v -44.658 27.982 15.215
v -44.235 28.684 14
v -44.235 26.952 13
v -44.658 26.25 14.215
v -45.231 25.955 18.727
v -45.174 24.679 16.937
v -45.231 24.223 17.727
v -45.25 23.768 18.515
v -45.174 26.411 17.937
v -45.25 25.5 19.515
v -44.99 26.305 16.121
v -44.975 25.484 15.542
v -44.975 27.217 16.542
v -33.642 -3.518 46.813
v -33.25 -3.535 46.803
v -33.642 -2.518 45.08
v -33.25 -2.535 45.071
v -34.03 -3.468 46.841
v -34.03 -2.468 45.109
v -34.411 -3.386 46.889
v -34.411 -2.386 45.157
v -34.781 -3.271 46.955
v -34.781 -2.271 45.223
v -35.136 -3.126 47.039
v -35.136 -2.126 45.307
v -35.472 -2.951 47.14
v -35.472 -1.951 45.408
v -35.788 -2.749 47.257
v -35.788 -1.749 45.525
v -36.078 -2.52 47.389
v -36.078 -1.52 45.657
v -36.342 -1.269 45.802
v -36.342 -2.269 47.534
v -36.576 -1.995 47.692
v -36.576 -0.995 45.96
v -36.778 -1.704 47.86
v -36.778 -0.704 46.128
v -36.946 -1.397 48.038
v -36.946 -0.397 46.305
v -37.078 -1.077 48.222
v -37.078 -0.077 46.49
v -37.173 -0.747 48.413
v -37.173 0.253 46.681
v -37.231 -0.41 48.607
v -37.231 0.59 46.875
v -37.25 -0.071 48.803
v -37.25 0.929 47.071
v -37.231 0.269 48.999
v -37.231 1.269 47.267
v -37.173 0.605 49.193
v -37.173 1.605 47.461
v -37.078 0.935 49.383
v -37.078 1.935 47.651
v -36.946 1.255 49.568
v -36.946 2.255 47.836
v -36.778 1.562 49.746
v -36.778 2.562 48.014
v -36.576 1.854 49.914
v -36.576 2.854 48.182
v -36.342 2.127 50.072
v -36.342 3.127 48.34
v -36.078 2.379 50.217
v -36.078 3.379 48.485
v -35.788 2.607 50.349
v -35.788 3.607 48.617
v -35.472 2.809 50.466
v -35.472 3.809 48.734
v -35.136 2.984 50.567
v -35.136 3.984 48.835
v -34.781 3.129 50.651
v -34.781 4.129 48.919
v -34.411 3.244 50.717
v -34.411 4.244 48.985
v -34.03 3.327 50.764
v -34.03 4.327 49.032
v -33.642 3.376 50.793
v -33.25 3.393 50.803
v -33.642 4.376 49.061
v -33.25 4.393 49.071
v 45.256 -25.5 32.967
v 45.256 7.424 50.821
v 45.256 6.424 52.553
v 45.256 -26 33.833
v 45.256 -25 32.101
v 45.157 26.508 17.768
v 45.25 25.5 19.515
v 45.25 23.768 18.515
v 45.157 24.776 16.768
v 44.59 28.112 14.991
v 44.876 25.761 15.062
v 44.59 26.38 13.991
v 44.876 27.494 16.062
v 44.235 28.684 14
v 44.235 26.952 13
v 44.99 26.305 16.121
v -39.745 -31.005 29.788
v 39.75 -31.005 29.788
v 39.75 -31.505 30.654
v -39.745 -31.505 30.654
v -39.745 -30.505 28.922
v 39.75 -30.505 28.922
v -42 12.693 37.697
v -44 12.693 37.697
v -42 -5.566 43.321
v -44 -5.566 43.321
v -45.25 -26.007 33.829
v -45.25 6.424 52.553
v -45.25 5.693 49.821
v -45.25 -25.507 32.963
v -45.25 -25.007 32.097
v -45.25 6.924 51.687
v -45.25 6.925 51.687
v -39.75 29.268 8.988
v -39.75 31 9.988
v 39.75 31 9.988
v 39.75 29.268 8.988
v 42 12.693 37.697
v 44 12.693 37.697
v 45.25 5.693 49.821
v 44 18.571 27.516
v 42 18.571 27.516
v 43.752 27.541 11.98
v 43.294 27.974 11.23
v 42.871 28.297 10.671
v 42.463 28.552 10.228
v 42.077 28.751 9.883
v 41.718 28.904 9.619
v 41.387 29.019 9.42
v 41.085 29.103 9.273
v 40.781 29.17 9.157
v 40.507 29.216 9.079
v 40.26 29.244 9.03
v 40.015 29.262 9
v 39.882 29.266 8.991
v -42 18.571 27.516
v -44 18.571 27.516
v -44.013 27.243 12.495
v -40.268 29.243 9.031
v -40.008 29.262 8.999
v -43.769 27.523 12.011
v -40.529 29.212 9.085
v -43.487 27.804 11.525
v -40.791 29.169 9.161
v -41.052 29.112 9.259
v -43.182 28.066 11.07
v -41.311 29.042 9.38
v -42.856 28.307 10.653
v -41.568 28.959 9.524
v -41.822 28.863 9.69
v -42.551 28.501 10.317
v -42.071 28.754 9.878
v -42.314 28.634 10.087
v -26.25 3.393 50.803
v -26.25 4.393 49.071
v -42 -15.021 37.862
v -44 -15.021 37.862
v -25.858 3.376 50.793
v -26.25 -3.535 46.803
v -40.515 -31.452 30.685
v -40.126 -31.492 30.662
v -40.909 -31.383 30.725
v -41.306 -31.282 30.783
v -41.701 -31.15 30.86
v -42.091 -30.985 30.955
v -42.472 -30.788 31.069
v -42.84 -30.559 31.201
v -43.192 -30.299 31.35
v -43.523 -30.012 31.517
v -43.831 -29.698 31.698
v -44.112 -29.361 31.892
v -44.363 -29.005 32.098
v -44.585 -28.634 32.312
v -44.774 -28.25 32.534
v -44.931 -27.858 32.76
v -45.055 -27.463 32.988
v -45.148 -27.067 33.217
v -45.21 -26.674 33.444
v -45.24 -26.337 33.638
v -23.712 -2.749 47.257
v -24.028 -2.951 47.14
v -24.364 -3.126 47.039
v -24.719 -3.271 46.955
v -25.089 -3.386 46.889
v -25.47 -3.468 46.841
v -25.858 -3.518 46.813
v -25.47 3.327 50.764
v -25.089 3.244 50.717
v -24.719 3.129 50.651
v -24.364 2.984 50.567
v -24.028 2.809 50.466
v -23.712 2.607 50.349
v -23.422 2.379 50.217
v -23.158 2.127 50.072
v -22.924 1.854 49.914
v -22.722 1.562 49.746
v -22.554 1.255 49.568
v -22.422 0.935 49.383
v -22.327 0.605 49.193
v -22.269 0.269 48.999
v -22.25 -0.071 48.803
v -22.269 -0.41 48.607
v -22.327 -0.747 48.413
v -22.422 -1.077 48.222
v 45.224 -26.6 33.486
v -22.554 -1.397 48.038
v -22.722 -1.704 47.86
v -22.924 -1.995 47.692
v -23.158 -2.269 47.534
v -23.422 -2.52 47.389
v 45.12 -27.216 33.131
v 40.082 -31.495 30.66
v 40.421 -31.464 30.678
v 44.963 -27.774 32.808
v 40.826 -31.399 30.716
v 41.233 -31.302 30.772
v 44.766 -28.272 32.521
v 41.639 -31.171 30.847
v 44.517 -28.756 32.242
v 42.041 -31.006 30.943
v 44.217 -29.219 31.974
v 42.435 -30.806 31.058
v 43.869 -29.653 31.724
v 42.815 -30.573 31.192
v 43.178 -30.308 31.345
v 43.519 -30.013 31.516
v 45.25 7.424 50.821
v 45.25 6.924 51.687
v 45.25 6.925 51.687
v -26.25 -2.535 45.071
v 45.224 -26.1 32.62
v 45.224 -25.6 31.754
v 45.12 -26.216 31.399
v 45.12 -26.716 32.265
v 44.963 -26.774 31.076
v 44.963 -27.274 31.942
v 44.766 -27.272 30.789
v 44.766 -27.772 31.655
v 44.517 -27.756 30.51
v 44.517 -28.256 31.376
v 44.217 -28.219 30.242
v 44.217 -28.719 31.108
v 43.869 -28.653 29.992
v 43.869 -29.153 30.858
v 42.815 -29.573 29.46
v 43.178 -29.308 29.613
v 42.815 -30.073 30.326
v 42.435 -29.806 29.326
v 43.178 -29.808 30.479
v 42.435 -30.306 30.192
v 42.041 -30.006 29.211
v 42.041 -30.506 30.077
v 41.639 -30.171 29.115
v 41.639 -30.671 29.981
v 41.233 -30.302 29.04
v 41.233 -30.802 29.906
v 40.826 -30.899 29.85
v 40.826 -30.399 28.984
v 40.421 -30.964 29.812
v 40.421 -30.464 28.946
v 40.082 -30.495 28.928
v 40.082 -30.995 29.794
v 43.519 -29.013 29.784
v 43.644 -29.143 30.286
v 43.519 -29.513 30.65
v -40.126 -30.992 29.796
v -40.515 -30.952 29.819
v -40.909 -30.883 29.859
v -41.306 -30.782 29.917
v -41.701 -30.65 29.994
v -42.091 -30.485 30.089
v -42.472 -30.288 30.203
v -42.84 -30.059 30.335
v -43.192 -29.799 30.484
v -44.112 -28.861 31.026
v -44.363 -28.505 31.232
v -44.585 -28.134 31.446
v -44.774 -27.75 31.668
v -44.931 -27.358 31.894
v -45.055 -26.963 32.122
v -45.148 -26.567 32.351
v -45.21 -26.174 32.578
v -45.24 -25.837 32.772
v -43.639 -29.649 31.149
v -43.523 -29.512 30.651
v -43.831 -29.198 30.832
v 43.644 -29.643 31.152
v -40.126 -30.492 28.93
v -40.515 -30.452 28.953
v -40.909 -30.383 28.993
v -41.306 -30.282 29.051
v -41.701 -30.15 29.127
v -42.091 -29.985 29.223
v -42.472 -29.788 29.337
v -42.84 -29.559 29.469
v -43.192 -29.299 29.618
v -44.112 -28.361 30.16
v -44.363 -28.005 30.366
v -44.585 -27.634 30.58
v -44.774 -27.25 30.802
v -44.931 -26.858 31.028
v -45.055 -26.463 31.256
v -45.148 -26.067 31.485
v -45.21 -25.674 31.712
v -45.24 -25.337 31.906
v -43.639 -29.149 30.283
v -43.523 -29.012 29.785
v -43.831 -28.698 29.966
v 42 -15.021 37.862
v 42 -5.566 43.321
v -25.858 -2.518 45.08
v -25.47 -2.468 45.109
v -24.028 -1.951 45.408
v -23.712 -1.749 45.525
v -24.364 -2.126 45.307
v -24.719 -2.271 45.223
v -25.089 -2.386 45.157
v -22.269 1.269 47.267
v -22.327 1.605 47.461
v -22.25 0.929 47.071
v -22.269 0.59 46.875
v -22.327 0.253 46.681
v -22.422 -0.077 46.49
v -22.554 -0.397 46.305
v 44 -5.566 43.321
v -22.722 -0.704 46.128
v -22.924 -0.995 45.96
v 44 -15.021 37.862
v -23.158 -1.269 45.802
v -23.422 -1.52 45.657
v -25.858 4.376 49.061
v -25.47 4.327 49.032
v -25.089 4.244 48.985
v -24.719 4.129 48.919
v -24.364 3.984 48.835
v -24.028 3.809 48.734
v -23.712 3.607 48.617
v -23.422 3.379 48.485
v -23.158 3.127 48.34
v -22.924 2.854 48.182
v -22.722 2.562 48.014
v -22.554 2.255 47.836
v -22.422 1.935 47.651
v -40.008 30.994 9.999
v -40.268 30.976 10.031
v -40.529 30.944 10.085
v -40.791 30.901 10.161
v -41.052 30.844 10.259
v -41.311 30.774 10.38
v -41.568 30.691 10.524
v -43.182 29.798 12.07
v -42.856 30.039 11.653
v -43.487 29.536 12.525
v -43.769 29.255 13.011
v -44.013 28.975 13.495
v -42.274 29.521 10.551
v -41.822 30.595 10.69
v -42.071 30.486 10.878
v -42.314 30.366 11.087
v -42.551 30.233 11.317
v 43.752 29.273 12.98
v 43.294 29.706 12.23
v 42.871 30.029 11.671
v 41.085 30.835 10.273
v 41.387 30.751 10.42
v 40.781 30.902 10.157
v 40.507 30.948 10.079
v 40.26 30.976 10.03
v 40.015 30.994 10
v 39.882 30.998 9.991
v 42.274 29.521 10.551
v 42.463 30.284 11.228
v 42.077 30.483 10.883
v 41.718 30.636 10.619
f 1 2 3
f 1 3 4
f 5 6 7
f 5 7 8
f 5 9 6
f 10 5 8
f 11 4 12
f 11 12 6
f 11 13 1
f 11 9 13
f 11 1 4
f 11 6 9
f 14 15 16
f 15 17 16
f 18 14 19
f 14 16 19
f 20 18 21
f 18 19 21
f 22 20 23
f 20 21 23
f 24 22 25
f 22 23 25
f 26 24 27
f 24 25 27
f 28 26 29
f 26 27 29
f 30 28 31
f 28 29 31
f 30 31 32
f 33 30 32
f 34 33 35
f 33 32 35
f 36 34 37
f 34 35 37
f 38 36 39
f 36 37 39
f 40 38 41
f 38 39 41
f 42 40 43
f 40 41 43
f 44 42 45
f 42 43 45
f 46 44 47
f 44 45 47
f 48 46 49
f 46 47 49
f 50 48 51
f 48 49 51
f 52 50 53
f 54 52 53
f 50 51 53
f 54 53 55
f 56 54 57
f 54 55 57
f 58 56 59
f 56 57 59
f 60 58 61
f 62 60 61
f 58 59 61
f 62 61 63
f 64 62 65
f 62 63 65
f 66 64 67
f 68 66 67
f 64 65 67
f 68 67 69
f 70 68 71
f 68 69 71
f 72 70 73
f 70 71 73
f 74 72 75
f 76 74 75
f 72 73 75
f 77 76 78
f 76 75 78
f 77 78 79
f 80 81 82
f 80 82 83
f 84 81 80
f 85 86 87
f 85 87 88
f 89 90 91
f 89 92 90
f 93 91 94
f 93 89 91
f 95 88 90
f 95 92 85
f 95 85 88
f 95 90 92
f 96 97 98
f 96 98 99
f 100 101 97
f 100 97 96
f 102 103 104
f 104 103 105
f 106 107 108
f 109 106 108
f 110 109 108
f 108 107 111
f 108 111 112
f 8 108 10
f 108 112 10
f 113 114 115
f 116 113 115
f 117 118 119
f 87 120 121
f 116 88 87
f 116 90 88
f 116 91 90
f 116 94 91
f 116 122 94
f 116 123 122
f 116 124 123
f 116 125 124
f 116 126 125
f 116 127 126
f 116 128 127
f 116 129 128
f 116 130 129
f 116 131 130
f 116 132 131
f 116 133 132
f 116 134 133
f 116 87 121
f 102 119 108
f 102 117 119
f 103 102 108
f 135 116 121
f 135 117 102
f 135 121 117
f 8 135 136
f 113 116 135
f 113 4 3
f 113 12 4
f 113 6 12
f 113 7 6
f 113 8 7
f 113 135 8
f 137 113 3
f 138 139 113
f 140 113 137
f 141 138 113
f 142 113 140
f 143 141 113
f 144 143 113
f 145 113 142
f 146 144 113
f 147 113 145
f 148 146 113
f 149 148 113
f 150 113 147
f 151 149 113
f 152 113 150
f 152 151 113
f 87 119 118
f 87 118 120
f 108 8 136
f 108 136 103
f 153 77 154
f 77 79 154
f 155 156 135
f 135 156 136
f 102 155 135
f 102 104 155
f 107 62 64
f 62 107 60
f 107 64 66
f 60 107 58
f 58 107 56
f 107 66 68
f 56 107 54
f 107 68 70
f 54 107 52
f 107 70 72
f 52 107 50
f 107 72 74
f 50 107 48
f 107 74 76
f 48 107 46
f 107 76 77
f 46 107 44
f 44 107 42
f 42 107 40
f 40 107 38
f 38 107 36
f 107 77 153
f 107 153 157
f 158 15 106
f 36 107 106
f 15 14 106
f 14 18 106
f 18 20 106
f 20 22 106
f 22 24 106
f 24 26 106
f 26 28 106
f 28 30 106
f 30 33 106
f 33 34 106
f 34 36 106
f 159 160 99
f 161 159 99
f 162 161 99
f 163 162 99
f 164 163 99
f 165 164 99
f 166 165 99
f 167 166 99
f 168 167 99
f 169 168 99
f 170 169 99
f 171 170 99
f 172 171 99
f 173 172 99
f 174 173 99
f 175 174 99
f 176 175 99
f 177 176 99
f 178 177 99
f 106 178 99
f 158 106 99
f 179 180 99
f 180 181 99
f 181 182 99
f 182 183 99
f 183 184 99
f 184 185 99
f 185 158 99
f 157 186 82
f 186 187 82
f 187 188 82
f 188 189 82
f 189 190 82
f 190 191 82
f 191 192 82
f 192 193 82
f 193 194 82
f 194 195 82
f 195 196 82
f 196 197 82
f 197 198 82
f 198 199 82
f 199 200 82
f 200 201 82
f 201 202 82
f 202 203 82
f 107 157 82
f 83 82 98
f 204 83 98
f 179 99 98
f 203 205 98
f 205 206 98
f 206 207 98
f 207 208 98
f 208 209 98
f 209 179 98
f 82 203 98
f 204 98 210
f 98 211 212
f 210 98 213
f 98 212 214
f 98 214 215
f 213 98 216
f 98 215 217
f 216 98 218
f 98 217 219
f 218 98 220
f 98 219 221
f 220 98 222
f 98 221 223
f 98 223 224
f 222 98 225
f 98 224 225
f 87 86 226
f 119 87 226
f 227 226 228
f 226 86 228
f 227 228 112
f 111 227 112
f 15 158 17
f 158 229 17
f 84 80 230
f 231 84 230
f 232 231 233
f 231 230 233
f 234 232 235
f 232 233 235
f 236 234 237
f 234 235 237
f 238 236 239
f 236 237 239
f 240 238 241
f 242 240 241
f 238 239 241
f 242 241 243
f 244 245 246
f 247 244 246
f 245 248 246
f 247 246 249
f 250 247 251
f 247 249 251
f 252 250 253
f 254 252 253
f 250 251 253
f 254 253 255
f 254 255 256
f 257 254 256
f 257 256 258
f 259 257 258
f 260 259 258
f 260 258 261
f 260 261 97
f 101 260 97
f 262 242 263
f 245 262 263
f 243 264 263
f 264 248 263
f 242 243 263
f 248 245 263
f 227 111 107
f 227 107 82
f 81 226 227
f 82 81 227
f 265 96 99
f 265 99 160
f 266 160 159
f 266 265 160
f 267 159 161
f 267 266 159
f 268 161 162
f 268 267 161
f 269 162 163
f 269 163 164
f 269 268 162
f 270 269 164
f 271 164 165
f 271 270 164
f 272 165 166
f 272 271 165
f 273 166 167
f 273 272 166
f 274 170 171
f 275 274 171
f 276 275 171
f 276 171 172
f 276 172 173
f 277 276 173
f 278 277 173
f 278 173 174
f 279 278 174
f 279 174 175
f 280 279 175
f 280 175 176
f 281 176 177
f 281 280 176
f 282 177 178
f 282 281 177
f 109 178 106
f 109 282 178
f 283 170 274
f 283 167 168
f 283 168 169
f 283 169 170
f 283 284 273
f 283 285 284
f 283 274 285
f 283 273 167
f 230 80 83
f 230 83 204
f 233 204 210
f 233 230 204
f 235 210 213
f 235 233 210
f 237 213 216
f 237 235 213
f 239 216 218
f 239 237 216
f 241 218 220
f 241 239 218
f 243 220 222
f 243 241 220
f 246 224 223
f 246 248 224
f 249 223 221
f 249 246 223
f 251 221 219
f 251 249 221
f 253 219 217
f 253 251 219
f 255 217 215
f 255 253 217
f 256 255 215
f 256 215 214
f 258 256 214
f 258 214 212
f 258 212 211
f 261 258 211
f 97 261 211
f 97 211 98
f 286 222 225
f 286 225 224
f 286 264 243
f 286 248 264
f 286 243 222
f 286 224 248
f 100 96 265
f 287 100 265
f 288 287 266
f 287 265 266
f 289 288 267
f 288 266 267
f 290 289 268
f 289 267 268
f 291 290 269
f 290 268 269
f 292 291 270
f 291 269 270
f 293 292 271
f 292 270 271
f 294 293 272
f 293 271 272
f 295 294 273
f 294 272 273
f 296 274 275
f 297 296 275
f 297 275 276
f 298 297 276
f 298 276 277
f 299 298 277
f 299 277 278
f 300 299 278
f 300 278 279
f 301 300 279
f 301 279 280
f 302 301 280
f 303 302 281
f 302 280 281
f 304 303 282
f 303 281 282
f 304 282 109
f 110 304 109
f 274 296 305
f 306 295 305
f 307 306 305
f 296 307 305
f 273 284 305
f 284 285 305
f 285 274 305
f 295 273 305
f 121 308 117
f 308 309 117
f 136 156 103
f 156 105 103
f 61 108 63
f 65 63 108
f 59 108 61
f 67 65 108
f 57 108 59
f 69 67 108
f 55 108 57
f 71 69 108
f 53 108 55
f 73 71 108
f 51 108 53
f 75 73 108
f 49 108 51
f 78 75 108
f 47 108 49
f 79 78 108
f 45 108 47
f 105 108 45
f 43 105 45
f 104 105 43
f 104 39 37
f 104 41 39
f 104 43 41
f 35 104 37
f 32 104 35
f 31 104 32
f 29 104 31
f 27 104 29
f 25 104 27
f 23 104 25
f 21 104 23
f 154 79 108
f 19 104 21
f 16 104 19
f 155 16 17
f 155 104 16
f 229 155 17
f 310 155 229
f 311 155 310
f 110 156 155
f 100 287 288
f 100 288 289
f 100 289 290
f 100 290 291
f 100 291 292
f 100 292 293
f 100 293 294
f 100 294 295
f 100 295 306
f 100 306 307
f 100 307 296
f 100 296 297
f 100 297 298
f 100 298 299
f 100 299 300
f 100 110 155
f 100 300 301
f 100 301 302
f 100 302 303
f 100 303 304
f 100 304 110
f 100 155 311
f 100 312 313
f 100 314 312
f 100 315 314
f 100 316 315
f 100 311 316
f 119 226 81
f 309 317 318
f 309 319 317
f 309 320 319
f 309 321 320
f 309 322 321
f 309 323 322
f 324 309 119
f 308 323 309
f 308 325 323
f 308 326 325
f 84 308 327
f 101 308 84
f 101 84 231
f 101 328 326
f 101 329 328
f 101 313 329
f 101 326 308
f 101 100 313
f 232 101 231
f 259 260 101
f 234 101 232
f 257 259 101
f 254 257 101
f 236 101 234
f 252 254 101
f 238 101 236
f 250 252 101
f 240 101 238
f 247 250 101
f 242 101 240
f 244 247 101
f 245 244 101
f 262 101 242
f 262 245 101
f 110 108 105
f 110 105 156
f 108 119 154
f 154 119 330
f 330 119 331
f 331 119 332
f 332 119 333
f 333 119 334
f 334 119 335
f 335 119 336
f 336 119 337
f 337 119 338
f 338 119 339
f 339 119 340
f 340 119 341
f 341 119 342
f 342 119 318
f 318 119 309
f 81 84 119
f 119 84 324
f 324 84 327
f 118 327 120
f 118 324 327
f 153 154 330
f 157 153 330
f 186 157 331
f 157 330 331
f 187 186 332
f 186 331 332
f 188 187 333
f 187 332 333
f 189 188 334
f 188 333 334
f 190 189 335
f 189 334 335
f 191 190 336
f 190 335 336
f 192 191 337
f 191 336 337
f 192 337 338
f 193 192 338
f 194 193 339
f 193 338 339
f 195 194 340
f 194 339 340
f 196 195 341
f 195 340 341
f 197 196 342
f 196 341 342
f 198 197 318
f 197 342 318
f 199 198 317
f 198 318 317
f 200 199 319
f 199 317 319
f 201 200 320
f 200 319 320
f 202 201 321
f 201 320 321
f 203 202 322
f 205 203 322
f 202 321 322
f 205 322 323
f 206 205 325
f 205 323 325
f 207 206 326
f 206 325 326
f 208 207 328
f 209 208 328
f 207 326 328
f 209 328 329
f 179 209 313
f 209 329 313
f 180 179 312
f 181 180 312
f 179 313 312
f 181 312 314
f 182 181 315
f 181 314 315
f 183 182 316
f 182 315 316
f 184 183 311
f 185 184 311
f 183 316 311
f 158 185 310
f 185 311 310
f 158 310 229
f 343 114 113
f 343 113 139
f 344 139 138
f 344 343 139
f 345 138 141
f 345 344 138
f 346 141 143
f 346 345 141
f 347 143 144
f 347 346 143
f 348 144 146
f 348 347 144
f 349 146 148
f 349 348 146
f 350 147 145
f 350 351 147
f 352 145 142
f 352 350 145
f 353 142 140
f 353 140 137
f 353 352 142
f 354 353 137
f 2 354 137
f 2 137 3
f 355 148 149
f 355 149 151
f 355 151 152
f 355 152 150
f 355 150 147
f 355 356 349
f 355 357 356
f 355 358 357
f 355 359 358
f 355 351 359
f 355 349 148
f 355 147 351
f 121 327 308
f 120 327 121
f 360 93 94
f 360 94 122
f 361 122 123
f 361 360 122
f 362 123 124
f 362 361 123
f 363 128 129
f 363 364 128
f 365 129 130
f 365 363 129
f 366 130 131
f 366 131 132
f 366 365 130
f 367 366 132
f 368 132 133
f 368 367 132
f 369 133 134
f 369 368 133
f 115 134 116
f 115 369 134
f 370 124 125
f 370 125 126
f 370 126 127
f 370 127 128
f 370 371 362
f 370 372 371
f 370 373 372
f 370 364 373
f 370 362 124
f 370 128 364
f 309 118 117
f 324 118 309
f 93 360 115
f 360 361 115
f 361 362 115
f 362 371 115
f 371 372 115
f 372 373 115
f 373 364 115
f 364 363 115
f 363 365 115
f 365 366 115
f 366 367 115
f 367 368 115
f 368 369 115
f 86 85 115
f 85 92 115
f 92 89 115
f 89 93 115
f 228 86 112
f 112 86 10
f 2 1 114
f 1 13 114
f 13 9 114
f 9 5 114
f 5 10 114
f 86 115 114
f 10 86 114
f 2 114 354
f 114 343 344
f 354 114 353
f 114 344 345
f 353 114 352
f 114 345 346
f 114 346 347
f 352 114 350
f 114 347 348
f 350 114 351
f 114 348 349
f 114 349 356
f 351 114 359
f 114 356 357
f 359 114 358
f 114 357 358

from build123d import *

# Parameters (mm, degrees)
EXTRUDE012_DEPTH                          = 2
EXTRUDE013_DEPTH                          = 2
EXTRUDE014_DEPTH                          = 2
EXTRUDE011_DEPTH                          = 1
EXTRUDE011_ONTO_SKETCH012_PLACEMENT_ANGLE = 210


with BuildPart() as extrude012:
    # Facebinder001 → Extrude012 (new body)
    with BuildSketch(Plane(origin=(0, 18.8977675755, 30.9501387124), x_dir=(-1, 0, 0), z_dir=(0, -0.8660254038, -0.5))):
        with BuildLine():
            Line((-45.25, 13.204464849), (-45.25, -23.9452774122))
            Line((-45.25, -23.9452774122), (45.25, -23.9452774122))
            Line((45.25, -23.9452774122), (45.25, 13.2044648491))
            add(Edge.make_bspline(
                [(44.2347028524, 19.5723342968), (45.25, 16.7121588166), (45.25, 13.2044648491)],
                knots=[0.953420723, 0.953420723, 0.953420723, 1.5707963268, 1.5707963268, 1.5707963268], degree=2, weights=[1, 0.9527330472, 1]))
            add(Edge.make_bspline(
                [(39.75, 24.204464849), (42.590402015, 24.204464849), (44.2347028524, 19.5723342968)],
                knots=[0, 0, 0, 0.953420723, 0.953420723, 0.953420723], degree=2, weights=[1, 0.8885092072, 1]))
            Line((39.75, 24.204464849), (-39.75, 24.204464849))
            add(Edge.make_bspline(
                [(-44.2347028524, 19.5723342968), (-42.590402015, 24.204464849), (-39.75, 24.204464849)],
                knots=[5.3297645842, 5.3297645842, 5.3297645842, 6.2831853072, 6.2831853072, 6.2831853072], degree=2, weights=[1, 0.8885092072, 1]))
            add(Edge.make_bspline(
                [(-45.25, 13.204464849), (-45.25, 16.7121588165), (-44.2347028524, 19.5723342968)],
                knots=[4.7123889804, 4.7123889804, 4.7123889804, 5.3297645842, 5.3297645842, 5.3297645842], degree=2, weights=[1, 0.9527330472, 1]))
        make_face()
    extrude(amount=EXTRUDE012_DEPTH)


with BuildPart() as extrude013:
    # Sketch013 → Extrude013 (new body)
    with BuildSketch(Plane.YZ.offset(44)):
        Polygon((-15.020984158, 37.8620624495), (18.5712846291, 27.5156237634), (12.6930780618, 37.6969761952), (-5.5661322003, 43.3208237725), align=None)
    extrude(amount=-EXTRUDE013_DEPTH)


with BuildPart() as extrude014:
    # Sketch013 → Extrude014 (new body)
    with BuildSketch(Plane.YZ.offset(44)):
        Polygon((-15.020984158, 37.8620624495), (18.5712846291, 27.5156237634), (12.6930780618, 37.6969761952), (-5.5661322003, 43.3208237725), align=None)
    extrude(amount=EXTRUDE014_DEPTH)


with BuildPart() as extrude014_1:
    # Extrude014 placement: moved
    add(extrude014.part.moved(Location((-88, 0, 0))))


with BuildPart() as connect003:
    # Sketch012 as drawn → Extrude011 (new, symmetric)
    with BuildSketch(Plane.XY):
        with BuildLine():
            add(Edge.make_bspline(
                [(-39.7453392309, 11.9568462189), (-45.2533288617, 11.9676394264), (-45.25, 5.6081389921)],
                knots=[6.2710703316, 6.2710703316, 6.2710703316, 7.8406972721, 7.8406972721, 7.8406972721], degree=2, weights=[1, 0.7075201008, 1]))
            Line((-45.25, 5.6081389921), (-45.25, -31.84))
            Line((-45.25, -31.84), (45.2563247467, -31.84))
            Line((45.2563247467, -31.84), (45.2563247467, 5.6002976112))
            add(Edge.make_bspline(
                [(45.2563247467, 5.6002976112), (45.2564552158, 11.9567126485), (39.75, 11.9568462189)],
                knots=[4.7124493405, 4.7124493405, 4.7124493405, 6.2832273717, 6.2832273717, 6.2832273717], degree=2, weights=[1, 0.7071132496, 1]))
            Line((39.75, 11.9568462189), (-39.7453392309, 11.9568462189))
        make_face()
        with BuildLine():
            ThreePointArc((-26.25, -28.34), (-22.25, -24.34), (-26.25, -20.34))
            Line((-26.25, -20.34), (-33.25, -20.34))
            ThreePointArc((-33.25, -20.34), (-37.25, -24.34), (-33.25, -28.34))
            Line((-33.25, -28.34), (-26.25, -28.34))
        make_face(mode=Mode.SUBTRACT)
    extrude(amount=EXTRUDE011_DEPTH, both=True)


with BuildPart() as connect003_1:
    # Extrude011 onto Sketch012 placement: moved
    add(connect003.part.moved(Location((0, -20.65, 35.7668491763))).rotate(Axis((0, -20.65, 35.7668491763), (1, 0, 0)), EXTRUDE011_ONTO_SKETCH012_PLACEMENT_ANGLE))

    # Connect003: union Extrude012, Extrude013, Extrude014
    add(extrude012.part)
    add(extrude013.part)
    add(extrude014_1.part)


solid = connect003_1.part
